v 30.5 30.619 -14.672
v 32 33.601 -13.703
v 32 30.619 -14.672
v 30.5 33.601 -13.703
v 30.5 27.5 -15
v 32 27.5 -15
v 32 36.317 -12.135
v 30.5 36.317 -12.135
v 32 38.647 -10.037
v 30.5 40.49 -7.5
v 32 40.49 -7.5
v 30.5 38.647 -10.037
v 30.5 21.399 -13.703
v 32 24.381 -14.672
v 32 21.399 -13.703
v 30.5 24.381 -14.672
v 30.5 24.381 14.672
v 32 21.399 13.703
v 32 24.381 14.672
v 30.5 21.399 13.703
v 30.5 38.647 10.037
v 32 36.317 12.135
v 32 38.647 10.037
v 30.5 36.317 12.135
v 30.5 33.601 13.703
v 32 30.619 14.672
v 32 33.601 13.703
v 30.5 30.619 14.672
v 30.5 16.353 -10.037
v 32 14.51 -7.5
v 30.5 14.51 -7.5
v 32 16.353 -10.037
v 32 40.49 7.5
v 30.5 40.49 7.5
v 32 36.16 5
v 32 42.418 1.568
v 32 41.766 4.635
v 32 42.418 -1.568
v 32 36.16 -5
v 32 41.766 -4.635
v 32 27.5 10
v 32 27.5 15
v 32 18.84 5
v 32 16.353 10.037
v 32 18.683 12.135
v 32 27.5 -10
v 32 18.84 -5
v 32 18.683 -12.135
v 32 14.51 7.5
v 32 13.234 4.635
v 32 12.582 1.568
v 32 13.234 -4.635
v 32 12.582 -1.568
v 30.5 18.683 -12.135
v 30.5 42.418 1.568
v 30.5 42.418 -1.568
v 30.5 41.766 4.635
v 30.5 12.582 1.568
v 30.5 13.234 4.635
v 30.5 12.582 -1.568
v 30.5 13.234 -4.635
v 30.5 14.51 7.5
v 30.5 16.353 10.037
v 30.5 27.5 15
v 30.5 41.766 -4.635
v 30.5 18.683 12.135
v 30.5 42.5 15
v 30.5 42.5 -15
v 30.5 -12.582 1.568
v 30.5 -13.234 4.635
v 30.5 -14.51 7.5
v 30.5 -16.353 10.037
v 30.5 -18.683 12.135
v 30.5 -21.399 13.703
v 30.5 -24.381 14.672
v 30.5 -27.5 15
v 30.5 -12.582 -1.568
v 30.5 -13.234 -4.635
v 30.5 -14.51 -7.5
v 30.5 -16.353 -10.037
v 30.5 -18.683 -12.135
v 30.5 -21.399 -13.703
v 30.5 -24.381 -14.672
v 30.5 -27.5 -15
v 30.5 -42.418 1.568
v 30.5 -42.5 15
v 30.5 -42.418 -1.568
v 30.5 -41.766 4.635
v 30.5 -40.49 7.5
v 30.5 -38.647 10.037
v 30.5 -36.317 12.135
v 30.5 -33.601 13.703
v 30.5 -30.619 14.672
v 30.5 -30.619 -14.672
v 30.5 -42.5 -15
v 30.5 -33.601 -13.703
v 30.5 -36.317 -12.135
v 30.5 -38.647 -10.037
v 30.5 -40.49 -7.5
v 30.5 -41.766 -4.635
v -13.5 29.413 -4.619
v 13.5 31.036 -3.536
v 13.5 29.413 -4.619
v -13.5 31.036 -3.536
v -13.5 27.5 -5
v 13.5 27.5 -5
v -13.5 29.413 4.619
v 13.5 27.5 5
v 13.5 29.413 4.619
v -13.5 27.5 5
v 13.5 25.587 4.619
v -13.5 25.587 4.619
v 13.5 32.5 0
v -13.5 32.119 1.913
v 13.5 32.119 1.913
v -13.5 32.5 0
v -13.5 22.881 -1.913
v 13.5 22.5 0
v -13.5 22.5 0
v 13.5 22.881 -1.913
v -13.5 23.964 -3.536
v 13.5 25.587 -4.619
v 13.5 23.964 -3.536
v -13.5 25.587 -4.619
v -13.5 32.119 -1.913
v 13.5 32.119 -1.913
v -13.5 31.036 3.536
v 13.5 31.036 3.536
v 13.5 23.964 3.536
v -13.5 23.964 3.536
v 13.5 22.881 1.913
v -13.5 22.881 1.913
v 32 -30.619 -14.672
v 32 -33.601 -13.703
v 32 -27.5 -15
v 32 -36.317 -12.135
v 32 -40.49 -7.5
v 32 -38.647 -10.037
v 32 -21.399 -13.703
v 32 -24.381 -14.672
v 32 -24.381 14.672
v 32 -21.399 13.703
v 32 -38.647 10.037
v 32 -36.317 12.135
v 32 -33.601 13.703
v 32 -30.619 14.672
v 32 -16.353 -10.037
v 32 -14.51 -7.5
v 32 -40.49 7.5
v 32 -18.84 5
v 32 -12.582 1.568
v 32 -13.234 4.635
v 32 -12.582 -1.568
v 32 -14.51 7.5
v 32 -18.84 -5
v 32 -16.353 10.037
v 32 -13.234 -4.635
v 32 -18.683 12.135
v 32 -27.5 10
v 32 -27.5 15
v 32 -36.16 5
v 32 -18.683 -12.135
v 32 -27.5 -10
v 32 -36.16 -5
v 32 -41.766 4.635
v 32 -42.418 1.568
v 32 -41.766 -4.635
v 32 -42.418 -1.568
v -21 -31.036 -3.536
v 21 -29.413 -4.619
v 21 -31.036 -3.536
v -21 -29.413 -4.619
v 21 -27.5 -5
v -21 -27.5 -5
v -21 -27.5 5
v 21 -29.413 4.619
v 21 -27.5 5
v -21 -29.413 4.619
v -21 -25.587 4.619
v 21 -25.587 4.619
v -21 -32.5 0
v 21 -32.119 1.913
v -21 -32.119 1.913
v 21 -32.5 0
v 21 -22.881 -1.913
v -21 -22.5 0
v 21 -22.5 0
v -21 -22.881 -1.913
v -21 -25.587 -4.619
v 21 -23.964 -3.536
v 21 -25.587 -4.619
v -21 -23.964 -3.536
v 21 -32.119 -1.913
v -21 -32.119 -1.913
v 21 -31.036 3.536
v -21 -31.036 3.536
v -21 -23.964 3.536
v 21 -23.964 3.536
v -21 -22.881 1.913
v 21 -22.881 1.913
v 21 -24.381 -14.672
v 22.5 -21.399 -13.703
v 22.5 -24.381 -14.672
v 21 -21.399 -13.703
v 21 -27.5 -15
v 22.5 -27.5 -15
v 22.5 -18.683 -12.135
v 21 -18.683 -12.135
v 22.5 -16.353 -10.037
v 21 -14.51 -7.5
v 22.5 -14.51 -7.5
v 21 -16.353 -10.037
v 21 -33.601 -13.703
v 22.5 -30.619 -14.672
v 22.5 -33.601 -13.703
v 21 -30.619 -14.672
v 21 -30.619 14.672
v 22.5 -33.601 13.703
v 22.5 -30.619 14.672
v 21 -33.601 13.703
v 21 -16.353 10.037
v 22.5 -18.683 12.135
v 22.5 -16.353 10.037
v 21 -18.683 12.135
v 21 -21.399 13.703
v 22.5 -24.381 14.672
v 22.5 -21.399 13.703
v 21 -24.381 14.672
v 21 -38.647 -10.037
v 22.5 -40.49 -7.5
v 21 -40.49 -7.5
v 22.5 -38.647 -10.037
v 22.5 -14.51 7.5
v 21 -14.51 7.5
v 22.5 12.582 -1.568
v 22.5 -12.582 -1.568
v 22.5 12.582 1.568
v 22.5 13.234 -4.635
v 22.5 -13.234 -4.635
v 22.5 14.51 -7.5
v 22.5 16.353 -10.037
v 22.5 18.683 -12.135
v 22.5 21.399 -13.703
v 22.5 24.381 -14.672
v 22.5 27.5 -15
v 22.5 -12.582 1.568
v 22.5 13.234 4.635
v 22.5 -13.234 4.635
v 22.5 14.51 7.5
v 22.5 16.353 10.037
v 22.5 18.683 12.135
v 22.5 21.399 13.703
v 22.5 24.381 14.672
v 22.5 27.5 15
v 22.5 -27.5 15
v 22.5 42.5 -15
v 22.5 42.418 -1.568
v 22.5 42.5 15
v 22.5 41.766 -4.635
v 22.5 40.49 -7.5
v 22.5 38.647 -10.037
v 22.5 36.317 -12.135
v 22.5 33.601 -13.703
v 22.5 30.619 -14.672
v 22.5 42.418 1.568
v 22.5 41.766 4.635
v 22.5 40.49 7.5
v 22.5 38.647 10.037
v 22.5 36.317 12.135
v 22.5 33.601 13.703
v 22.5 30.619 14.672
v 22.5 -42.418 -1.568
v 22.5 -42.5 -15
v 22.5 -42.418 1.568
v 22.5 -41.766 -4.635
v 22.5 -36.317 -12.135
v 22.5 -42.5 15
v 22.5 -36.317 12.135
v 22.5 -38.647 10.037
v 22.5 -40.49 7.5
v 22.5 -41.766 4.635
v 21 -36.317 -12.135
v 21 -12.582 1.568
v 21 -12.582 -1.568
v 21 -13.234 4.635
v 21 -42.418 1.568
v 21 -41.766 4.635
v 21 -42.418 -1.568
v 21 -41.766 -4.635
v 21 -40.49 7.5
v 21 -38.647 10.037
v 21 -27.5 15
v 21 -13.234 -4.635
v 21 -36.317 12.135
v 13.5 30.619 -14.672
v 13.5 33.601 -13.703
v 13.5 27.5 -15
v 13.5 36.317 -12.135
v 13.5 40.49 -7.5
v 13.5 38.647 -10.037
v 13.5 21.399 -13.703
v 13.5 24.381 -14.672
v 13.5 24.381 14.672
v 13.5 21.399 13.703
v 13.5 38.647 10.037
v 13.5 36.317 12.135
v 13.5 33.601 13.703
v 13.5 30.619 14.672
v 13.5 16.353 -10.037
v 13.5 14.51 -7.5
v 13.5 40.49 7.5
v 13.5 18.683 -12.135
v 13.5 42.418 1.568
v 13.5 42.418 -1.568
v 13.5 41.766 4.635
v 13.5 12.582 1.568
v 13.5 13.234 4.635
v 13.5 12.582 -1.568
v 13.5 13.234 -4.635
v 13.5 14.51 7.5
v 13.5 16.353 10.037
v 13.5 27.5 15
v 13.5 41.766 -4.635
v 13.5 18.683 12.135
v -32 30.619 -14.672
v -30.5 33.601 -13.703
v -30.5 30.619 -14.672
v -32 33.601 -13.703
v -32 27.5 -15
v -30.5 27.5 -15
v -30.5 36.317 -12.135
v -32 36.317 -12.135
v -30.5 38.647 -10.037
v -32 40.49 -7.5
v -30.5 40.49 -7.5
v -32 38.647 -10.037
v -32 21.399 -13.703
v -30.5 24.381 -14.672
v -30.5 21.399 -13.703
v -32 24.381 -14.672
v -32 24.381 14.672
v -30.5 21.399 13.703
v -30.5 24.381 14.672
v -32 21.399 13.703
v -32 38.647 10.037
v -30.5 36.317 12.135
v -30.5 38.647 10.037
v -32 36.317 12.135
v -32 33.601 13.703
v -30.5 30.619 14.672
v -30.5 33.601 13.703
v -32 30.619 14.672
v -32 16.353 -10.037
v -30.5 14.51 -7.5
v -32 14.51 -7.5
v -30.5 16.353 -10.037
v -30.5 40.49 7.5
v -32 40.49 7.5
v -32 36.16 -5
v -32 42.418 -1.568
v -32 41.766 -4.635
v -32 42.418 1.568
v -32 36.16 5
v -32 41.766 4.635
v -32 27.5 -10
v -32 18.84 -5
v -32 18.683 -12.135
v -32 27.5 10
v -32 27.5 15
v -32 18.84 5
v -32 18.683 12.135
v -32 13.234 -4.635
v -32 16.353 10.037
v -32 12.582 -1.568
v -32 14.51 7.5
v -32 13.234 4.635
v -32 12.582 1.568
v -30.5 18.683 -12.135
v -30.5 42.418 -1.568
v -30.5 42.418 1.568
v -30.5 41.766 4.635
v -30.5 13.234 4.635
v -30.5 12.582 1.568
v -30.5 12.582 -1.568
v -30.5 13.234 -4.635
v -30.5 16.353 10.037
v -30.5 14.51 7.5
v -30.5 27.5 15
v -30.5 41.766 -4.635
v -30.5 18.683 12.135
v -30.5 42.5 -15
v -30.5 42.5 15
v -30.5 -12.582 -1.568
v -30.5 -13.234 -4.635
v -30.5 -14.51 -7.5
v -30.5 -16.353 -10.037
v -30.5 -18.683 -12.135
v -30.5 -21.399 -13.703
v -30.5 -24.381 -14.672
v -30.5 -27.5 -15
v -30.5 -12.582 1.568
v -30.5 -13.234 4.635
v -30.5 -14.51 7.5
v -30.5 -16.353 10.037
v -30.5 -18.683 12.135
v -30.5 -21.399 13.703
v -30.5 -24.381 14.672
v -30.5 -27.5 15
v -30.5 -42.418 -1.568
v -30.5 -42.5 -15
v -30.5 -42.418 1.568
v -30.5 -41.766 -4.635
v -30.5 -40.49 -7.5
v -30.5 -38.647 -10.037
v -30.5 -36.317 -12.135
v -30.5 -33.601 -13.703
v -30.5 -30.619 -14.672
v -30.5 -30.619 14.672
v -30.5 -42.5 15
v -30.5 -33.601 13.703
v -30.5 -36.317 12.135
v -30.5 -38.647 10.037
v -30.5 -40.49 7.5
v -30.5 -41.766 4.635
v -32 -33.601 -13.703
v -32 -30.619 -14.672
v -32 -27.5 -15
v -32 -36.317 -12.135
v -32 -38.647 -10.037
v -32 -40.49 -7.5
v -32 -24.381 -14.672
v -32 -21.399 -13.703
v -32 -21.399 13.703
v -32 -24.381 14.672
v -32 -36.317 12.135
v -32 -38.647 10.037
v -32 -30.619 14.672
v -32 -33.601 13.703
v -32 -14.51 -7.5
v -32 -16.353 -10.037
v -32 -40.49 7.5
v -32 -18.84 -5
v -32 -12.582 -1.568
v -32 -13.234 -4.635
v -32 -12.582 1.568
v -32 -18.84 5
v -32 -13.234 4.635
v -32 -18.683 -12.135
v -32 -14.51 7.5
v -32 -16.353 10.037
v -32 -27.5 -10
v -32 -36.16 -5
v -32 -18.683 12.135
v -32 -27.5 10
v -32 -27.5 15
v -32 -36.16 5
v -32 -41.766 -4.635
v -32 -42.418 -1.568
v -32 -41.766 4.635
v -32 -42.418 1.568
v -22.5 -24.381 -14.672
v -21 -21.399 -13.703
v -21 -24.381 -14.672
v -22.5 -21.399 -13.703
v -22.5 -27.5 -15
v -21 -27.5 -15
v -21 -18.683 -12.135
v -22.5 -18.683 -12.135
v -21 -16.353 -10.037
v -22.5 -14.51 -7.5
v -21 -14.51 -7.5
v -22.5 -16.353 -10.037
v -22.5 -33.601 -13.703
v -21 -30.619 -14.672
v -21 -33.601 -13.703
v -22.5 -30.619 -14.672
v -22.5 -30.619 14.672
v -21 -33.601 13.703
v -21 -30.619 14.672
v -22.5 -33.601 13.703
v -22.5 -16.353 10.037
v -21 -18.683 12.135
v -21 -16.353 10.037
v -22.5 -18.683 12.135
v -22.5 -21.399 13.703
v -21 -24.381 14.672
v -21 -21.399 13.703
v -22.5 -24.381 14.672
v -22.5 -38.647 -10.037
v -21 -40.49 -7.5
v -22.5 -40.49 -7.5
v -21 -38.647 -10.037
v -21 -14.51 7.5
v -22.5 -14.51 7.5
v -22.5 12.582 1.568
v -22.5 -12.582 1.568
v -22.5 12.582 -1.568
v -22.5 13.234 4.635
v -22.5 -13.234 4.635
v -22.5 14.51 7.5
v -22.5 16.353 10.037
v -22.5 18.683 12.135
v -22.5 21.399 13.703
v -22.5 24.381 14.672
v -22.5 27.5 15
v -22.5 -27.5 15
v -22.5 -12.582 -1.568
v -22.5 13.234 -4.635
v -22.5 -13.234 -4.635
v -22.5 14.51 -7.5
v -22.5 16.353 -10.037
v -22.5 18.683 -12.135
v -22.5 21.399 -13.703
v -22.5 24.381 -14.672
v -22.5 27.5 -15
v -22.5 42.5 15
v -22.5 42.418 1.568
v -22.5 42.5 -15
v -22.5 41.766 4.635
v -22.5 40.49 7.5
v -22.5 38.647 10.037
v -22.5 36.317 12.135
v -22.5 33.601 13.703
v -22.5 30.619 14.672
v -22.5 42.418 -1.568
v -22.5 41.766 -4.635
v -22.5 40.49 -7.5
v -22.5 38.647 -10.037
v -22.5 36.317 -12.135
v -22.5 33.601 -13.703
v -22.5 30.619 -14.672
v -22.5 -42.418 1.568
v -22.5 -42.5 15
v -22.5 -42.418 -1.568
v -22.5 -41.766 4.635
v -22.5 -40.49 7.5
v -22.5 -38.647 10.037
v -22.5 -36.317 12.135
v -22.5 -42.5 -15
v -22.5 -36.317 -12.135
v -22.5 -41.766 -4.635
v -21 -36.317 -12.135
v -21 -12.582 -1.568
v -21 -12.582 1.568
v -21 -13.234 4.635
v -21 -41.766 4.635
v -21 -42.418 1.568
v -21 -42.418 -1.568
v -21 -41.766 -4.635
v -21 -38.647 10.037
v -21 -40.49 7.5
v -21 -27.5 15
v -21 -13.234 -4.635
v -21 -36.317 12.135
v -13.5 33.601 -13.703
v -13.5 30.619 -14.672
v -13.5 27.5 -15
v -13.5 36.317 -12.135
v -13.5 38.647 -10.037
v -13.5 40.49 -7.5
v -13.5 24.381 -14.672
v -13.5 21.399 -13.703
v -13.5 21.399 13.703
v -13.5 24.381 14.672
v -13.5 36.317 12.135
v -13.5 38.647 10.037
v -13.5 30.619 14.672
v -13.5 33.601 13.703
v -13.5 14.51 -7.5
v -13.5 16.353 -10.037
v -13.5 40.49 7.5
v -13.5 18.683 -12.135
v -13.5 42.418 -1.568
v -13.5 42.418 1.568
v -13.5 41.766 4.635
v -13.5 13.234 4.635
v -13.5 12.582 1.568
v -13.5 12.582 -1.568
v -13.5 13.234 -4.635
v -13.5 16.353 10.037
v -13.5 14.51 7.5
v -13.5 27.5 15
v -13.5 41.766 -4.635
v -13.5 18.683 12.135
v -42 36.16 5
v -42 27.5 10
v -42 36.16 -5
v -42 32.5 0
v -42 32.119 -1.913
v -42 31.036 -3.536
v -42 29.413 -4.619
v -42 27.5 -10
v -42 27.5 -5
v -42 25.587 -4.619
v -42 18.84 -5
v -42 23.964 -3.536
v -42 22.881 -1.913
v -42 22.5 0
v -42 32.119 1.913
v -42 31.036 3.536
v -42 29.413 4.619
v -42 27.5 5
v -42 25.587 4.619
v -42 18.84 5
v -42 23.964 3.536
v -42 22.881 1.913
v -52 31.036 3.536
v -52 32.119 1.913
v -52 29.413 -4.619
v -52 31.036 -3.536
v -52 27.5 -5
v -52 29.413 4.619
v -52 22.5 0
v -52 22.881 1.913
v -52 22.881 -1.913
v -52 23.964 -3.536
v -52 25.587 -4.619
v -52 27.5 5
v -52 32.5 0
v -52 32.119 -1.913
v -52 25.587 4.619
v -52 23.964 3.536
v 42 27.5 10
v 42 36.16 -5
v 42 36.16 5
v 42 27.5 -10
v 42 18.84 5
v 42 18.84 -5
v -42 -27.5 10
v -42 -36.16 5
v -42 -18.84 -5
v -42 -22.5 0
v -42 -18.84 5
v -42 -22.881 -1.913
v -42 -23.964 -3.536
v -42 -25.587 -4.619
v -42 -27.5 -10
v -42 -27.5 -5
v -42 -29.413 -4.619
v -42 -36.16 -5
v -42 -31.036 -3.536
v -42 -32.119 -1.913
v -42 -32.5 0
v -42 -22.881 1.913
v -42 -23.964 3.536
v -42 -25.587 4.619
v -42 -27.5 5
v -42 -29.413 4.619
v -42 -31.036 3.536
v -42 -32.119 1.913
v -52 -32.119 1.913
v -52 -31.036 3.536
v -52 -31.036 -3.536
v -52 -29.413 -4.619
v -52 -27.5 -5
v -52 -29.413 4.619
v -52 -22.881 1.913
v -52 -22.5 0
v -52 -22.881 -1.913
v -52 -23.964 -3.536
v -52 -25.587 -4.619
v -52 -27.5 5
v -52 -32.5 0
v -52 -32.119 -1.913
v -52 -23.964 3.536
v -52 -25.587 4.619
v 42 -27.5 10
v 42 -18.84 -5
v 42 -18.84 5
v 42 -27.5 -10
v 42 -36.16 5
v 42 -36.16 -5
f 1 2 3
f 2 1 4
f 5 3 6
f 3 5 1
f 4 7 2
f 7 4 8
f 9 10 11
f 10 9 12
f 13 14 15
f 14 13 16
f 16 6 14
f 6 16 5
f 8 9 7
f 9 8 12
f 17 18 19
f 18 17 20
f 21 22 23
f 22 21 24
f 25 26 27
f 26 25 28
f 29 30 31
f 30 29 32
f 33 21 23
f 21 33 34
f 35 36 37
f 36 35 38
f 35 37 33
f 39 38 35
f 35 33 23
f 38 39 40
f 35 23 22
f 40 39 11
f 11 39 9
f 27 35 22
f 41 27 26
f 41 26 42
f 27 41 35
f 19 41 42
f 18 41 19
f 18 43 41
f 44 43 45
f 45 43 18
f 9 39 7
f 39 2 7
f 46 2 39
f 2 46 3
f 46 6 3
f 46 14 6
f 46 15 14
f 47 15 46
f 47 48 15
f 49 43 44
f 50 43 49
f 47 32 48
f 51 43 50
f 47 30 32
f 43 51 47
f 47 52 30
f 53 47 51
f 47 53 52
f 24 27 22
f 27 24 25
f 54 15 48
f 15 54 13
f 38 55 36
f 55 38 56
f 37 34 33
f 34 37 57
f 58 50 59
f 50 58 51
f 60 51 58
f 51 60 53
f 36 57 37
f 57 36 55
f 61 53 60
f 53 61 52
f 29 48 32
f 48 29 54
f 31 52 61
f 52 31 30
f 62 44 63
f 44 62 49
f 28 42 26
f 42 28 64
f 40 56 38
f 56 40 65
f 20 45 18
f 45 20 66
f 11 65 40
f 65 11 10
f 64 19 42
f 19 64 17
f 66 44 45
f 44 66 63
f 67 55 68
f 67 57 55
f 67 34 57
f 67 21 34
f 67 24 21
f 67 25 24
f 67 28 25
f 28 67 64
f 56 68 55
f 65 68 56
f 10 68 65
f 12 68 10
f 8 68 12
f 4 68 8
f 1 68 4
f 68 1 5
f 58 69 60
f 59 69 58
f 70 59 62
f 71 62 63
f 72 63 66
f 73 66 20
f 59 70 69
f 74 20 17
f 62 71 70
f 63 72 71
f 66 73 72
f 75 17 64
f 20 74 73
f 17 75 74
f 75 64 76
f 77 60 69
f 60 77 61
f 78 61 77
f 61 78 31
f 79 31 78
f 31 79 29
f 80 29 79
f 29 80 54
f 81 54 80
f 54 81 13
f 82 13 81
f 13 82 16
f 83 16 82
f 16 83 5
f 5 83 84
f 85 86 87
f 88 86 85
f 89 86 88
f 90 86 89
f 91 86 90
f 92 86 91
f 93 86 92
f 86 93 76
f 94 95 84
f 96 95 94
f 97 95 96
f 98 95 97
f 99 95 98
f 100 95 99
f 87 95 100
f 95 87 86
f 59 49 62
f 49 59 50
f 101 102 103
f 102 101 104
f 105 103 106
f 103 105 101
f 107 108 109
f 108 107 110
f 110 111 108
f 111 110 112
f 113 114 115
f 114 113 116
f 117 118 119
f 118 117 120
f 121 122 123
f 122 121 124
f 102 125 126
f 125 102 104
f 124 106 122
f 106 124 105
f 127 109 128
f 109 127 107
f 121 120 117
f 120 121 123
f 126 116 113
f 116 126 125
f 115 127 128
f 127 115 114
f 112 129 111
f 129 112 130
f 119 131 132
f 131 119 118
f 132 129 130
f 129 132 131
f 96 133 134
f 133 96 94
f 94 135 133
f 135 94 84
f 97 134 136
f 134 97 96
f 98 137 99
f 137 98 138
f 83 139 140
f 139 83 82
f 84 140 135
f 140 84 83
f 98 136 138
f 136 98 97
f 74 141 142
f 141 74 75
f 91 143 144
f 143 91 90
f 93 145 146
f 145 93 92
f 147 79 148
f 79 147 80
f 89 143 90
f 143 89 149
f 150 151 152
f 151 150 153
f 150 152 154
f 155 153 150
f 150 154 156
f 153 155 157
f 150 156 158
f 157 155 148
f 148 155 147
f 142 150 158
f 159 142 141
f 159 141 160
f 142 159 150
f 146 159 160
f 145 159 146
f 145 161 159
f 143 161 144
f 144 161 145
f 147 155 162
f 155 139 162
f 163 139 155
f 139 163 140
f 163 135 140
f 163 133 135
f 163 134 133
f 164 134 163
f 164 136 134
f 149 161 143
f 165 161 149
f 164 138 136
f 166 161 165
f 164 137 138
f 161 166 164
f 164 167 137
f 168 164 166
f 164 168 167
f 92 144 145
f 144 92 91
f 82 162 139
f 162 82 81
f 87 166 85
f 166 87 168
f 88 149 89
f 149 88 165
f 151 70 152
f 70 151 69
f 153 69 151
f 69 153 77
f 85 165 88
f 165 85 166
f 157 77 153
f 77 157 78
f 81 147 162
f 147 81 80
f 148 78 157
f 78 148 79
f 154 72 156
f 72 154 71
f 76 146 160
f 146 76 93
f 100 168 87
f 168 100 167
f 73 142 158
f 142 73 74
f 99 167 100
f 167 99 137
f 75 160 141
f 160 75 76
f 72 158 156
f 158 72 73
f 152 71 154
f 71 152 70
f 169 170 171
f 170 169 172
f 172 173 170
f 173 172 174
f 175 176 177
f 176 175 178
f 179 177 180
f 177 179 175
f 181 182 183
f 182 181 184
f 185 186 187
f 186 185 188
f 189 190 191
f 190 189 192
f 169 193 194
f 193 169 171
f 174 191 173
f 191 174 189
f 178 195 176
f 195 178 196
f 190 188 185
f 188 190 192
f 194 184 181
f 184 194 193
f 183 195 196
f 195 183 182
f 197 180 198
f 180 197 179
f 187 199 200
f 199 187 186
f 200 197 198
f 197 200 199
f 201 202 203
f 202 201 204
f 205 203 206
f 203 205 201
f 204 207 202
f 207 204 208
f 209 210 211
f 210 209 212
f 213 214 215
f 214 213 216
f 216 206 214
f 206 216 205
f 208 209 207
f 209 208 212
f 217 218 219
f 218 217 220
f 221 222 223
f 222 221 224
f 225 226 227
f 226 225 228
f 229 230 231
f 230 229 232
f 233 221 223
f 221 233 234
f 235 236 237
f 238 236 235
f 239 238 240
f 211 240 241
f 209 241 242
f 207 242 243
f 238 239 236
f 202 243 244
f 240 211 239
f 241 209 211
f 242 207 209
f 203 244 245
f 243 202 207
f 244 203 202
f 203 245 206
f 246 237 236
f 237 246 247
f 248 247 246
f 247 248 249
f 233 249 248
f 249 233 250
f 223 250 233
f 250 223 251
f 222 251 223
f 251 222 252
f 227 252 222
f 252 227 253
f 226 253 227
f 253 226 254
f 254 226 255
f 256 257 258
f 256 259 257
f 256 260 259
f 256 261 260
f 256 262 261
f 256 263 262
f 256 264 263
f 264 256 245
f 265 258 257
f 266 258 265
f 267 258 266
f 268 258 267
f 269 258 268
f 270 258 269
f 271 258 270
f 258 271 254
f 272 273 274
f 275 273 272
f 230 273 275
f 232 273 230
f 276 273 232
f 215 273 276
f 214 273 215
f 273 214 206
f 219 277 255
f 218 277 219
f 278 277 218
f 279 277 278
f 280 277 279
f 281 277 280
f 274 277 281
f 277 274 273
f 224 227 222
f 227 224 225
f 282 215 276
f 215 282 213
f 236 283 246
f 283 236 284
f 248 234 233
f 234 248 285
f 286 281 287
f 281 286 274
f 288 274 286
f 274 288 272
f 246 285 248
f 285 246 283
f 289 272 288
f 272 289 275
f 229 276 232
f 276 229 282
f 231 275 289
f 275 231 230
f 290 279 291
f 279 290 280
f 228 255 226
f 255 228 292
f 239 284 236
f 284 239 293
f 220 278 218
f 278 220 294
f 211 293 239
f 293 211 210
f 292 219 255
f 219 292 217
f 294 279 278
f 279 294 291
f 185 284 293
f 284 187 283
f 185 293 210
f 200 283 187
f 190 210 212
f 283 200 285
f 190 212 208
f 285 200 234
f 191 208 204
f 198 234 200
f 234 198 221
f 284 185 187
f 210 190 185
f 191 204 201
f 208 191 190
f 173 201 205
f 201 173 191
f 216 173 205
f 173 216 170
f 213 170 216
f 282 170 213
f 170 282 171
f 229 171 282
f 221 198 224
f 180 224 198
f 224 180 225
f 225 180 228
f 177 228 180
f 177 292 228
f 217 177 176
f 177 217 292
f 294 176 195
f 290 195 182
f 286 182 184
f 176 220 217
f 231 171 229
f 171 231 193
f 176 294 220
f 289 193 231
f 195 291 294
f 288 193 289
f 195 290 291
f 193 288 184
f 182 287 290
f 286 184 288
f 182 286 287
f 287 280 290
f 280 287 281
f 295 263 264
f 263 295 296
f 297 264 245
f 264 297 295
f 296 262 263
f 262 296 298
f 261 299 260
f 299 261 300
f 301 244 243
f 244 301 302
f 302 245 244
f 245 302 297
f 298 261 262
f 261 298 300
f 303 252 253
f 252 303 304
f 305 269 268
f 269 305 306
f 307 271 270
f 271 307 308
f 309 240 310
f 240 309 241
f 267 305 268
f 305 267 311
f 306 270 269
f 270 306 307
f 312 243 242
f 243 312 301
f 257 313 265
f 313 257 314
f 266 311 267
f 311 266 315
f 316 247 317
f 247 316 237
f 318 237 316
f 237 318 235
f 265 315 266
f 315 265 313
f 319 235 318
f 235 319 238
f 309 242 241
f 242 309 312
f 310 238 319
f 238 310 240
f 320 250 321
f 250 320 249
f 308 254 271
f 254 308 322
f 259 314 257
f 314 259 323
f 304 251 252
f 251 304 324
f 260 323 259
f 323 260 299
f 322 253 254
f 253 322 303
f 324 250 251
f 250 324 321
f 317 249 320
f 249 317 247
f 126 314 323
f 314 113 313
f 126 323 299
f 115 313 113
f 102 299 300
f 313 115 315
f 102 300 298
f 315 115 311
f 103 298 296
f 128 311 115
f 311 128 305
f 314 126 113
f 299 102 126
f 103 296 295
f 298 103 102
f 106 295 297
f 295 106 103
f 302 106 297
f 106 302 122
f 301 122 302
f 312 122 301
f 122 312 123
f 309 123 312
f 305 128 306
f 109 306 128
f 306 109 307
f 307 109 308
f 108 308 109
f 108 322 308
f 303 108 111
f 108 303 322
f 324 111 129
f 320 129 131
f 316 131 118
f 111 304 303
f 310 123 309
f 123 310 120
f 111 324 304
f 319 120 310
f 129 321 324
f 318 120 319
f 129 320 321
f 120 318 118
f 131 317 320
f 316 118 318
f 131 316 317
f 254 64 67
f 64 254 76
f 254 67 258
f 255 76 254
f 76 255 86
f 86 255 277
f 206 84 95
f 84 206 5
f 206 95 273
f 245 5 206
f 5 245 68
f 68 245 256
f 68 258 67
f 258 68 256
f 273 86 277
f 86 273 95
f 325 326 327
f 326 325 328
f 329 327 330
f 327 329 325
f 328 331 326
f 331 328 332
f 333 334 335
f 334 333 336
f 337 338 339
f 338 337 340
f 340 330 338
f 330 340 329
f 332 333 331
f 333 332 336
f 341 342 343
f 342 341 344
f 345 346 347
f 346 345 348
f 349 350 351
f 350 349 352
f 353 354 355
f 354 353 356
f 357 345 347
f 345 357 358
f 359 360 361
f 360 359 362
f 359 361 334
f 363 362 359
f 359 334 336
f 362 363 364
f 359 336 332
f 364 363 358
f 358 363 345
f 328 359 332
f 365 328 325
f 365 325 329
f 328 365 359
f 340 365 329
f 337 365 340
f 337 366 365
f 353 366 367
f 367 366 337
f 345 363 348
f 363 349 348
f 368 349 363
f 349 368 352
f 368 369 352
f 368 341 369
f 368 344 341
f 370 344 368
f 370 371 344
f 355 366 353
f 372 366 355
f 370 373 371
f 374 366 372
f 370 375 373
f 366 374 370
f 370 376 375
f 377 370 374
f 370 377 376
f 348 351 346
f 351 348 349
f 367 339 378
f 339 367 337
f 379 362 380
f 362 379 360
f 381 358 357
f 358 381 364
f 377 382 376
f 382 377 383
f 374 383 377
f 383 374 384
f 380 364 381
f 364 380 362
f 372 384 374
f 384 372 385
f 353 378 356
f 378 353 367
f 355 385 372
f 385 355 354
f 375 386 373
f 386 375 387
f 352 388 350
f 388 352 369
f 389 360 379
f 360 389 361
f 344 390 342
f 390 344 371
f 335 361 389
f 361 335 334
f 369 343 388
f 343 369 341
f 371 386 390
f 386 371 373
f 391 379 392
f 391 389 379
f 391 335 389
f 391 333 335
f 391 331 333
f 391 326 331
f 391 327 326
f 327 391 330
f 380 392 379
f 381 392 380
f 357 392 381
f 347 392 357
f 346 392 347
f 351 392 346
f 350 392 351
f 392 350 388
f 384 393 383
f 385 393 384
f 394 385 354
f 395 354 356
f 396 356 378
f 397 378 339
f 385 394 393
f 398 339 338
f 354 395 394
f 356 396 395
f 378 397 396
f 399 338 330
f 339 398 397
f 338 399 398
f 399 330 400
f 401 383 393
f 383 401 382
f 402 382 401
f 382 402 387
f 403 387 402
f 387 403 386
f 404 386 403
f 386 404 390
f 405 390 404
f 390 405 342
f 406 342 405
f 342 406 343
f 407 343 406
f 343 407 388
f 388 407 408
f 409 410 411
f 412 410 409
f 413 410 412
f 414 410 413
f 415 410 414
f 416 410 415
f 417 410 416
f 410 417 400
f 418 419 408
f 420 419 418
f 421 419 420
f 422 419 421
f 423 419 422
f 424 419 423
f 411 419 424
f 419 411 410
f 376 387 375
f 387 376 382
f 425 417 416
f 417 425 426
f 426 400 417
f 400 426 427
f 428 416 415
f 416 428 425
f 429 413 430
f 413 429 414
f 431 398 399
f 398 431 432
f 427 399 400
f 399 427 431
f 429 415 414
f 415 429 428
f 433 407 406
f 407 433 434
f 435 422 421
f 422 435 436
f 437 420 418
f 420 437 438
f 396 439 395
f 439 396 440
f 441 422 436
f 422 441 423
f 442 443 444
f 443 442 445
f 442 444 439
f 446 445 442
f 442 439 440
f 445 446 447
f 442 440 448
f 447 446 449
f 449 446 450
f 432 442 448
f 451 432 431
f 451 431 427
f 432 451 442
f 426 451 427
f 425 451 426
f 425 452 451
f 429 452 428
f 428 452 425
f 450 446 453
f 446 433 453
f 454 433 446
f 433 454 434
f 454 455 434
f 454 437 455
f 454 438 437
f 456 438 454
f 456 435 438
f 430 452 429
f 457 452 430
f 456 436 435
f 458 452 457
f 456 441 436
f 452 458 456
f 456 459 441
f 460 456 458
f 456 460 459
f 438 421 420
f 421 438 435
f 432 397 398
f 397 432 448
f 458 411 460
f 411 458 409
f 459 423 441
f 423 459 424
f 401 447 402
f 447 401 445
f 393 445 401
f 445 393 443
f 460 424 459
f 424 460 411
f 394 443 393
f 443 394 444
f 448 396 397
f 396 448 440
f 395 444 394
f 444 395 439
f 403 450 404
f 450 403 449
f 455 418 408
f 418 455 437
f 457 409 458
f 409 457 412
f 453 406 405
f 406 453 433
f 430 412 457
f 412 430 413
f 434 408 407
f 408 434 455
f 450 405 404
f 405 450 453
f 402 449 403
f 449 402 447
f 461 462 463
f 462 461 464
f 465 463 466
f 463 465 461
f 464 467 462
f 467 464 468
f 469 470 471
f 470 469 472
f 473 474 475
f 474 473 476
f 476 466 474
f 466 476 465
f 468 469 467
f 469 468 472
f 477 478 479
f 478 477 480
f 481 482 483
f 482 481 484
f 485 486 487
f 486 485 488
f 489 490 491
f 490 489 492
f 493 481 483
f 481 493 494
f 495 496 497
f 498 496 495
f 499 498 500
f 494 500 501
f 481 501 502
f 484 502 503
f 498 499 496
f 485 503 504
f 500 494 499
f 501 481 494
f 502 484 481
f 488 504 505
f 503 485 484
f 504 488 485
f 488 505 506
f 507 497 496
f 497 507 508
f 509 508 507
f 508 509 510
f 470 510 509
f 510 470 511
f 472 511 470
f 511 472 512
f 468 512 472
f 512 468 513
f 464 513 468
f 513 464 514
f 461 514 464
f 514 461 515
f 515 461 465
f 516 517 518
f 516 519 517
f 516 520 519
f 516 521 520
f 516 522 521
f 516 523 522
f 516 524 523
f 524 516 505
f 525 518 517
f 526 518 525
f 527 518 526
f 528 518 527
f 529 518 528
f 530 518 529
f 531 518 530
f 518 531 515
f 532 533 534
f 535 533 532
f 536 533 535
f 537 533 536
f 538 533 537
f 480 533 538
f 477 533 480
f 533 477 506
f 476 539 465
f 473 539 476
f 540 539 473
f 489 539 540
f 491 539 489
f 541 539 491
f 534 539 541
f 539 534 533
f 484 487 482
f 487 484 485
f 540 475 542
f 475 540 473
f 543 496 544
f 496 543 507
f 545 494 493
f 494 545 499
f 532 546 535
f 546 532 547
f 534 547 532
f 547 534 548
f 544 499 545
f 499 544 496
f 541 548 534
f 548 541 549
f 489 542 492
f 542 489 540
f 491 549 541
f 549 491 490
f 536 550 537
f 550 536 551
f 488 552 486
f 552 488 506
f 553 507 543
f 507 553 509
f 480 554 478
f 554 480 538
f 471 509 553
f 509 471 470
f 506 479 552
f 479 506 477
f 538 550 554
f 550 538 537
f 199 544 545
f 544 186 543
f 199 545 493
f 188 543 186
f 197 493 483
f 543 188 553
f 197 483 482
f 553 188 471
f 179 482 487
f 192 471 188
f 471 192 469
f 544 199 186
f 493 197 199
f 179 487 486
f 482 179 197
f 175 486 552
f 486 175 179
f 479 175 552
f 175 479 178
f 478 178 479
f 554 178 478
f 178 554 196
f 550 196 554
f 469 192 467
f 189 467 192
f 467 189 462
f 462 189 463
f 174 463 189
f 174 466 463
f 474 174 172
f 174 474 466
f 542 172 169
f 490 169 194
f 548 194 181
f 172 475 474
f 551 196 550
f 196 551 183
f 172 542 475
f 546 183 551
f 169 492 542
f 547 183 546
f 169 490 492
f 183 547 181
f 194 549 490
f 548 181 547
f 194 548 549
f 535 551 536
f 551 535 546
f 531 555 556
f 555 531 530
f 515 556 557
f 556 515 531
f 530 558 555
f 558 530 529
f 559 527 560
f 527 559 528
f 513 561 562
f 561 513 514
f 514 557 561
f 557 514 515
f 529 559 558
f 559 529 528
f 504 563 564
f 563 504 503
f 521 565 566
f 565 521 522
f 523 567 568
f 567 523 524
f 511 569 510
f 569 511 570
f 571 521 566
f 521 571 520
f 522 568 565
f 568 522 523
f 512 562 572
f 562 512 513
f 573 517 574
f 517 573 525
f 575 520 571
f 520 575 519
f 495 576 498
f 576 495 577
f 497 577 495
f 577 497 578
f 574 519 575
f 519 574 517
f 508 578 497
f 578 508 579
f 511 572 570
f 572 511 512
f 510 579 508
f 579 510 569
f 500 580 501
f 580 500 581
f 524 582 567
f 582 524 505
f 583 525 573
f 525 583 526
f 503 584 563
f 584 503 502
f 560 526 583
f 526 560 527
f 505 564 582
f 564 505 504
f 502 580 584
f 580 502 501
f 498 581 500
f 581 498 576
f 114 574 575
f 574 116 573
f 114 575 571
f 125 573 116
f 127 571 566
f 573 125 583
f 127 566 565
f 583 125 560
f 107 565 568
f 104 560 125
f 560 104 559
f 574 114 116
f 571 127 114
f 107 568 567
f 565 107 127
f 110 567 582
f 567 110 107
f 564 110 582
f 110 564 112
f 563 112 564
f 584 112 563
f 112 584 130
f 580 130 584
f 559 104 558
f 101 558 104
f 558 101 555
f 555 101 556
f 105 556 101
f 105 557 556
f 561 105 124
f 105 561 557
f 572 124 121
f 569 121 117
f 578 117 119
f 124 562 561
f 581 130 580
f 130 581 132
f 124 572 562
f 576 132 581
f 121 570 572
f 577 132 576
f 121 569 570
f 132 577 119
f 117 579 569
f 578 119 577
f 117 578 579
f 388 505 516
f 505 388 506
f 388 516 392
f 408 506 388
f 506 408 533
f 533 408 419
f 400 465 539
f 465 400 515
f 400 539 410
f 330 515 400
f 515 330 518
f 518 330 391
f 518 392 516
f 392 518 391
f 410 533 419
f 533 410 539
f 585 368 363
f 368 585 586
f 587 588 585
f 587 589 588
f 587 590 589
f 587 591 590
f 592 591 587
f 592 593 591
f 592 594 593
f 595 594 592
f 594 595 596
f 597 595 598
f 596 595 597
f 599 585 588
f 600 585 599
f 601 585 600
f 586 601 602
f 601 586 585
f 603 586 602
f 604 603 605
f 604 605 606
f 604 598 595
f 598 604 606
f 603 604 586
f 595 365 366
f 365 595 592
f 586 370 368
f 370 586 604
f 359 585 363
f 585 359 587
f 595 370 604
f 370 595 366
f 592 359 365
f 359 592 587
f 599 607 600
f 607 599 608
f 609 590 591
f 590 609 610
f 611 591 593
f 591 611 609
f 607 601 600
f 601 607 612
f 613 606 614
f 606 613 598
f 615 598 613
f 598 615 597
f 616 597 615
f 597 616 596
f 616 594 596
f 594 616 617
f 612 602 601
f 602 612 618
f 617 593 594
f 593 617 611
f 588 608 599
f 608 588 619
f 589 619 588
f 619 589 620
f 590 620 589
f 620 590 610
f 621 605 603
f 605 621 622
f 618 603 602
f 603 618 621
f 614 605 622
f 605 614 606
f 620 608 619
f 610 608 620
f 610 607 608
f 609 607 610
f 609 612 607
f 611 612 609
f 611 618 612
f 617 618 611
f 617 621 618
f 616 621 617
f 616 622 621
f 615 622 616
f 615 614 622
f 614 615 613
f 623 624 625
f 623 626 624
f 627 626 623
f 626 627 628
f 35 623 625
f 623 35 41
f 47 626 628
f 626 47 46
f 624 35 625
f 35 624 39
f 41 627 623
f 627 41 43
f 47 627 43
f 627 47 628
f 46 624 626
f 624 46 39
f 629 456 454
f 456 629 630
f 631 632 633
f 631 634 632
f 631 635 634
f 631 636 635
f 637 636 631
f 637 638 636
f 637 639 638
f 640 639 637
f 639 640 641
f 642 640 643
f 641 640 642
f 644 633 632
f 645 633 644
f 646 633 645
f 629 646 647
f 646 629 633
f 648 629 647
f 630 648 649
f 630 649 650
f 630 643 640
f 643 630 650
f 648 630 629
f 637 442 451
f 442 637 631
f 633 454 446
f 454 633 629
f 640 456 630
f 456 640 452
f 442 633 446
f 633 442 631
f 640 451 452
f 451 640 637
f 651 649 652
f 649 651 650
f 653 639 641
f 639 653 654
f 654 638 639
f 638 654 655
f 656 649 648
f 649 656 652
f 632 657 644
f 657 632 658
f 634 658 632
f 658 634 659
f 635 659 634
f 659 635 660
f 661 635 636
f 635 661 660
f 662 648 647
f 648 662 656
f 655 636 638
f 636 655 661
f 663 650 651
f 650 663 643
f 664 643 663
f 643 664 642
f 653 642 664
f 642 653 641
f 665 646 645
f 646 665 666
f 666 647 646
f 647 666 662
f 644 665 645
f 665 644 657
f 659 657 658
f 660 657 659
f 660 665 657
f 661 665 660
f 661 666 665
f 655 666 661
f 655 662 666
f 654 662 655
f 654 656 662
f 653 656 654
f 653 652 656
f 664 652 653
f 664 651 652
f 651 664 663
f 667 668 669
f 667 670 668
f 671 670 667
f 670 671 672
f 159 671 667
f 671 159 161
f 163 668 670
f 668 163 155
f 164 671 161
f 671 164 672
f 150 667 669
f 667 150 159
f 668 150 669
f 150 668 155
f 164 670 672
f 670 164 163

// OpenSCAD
// file: ../common/metric_nut.scad
// include <../../config.scad>;
use <./beam_hexagonal.scad>;
use <./metric_bolt_functions.scad>;

module metric_nut(size, centre = true) {
    height = get_metric_bolt_head_height(size);
    diameter = get_metric_bolt_head_diameter(size);
    radius = diameter / 2;
    color("gray") difference() {
        // body
        beam_hexagonal(height, diameter, centre = centre, suppress_shopping_outputs = true);
        // hole
        cylinder(height, size / 2, size / 2, center = centre);
    }
    // Shopping
    echo(str("Nut: Nut M", size, " - x1"));
}

// $fn = 200;
metric_nut(12);
// file: ../common/beam_hexagonal.scad
// include <../../config.scad>;

module beam_hexagonal(L, d, centre = true, suppress_shopping_outputs = false) {
    radius = d / 2;
    linear_extrude(L, center = centre) polygon([[radius, 0], [radius * cos(60), radius * sin(60)], [radius * cos(120), radius * sin(120)], [radius * cos(180), radius * sin(180)], [radius * cos(240), radius * sin(240)], [radius * cos(300), radius * sin(300)]]);
    // Shopping
    if (!suppress_shopping_outputs) {
        echo(str("Hexagonal beam: Hexagonal beam Φ", d, "mm x ", L, "mm - x1"));
    }
}

// $fn = 200;
beam_hexagonal(500, 50);
// file: ../fixings/tube_clamp_square_base_plate_132_functions.scad
function get_L_shaft_with_base_plate_square_base_plate_132(beam_width) = 
    // (beam_width == 40) ?
    75
;
function get_R_plate_square_base_plate_132(beam_width) = 
    // (beam_width == 40) ?
    [143, 75, 18.5]
;
function get_thickness_square_base_plate_132(beam_width) = 
    // (beam_width == 40) ?
    8
;
function get_offset_hole_x_square_base_plate_132(beam_width) = 
    // (beam_width == 40) ?
    100 / 2
;
function get_diameter_hole_square_base_plate_132(beam_width) = 
    // (beam_width == 40) ?
    10
;
// file: ../fixings/tube_clamp_round_base_plate_132_functions.scad
function get_L_shaft_with_base_plate_round_base_plate_132(tube_diameter) = 
    (tube_diameter == 27) ? 
        85
    : (tube_diameter == 42) ?
        122
    : 25
;
function get_R_plate_round_base_plate_132(tube_diameter) = 
    (tube_diameter == 27) ? 
        [64, 114, 7]
    : (tube_diameter == 42) ?
        [80, 140, 10]
    : [10, 20, 1]
;
function get_offset_hole_y_round_base_plate_132(tube_diameter) = 
    (tube_diameter == 27) ? 
        38
    : (tube_diameter == 42) ?
        50
    : 10
;
function get_diameter_hole_round_base_plate_132(tube_diameter) = 10;
// file: ../fixings/tube_clamp_round_3_way_through_116_functions.scad
function  get_L_shaft_long_round_3_way_through_116(tube_diameter) = 
    (tube_diameter == 27) ? 
        42
    : (tube_diameter == 42) ?
        60
    : 25
;
function get_thickness_round_3_way_through_116(tube_diameter) = 7;
function get_L_shaft_short_round_3_way_through_116(tube_diameter) = tube_diameter + 2 * get_thickness_round_3_way_through_116();
// file: ../fixings/tube_clamp_round_tee_long_104_functions.scad
// include <../../config.scad>;

function get_L_shaft_long_round_tee_long_104(tube_diameter) = 
    (tube_diameter == 27) ? 
        85
    : (tube_diameter == 42) ?
        122
    : 25
;
function get_L_shaft_short_round_tee_long_104(tube_diameter) = 
    (tube_diameter == 27) ? 
        42
    : (tube_diameter == 42) ?
        61
    : 10
;
// file: ../brake/brake_assembly_functions.scad
// include <../../config.scad>; // circular reference!

function get_y_pos_lead_fixing_ballscrew_to_brake_arms(angle_brake_rod, y_pos_axle_rear, x_pos_axle_leg_rear, x_offset_fixing_brake_arm_to_lead_plate) = y_pos_axle_rear + (x_pos_axle_leg_rear - x_offset_fixing_brake_arm_to_lead_plate) / tan(angle_brake_rod); // (X_POS_AXLE_LEG_REAR - X_OFFSET_FIXING_BRAKE_ARM_TO_LEAD_PLATE)
// file: ../common/metric_bolt_functions.scad
function get_metric_bolt_head_height(size) = size;
function get_metric_bolt_head_diameter(size) = size * 2;
function get_metric_bolt_washer_diameter_safe_working_clearance(size) = 
    (size < 20) ?
        4 * size
    :
        3 * size
;
// file: ../common/washer.scad
include <../../config.scad>;

module washer(t, d_outer, d_inner, centre = true) {
    r_outer = d_outer / 2;
    r_inner = d_inner / 2;
    color("silver") difference() {
        cylinder(t, r_outer, r_outer, center = centre);
        cylinder(t, r_inner, r_inner, center = centre);
    }
    // Shopping
    echo(str("Washer: Washer Φ", d_outer, "mm x ", d_inner, "mm x ", t, "mm - x1"));
}

// $fn = 200;
washer(3, 10, 40);
// file: ../common/metric_bolt.scad
// include <../../config.scad>;
use <./beam_hexagonal.scad>;
use <./metric_bolt_functions.scad>;
use <./metric_nut.scad>;

module metric_bolt(size, length, has_nut = true, offset_nut_from_end = 0) {
    echo("Metric bolt assembly:");
    head_height = get_metric_bolt_head_height(size);
    head_diameter = get_metric_bolt_head_diameter(size);
    head_radius = head_diameter / 2;
    color("gray") union() {
        // Stem
        cylinder(length, size / 2, size / 2, center = true);
        // Head
        translate([0, 0, length / 2 - size / 2]) beam_hexagonal(head_height, head_diameter, centre = true, suppress_shopping_outputs = true);
        if (has_nut) {
            // Nut
            translate([0, 0, -(length / 2 - size / 2) + offset_nut_from_end]) metric_nut(size);
        }
    }
    // Shopping
    echo(str("Bolt: Bolt M", size, " x ", length, "mm - x1"));
}

// $fn = 200;
metric_bolt(12, 100);
translate([30, 0, 0]) metric_bolt(12, 100, false);
translate([60, 0, 0]) metric_bolt(12, 100, true, 5);
// main file
include <../../config.scad>;
use <../common/metric_bolt.scad>;
use <../common/washer.scad>;

module tiller_joint() {
    echo("Tiller joint assembly:");
    R_plate_tiller = [T_PLATE, L_JOINT_TILLER_EXTENSION, 3 * SIZE_BOLT_JOINT_TILLER_EXTENSION];
    x_pos_plate = (D_AXLE_FRONT + R_plate_tiller[0]) / 2 + T_WASHER_TILLER_JOINT;
    h_bolt_head = get_metric_bolt_head_height(SIZE_BOLT_JOINT_TILLER_EXTENSION);
    L_bolt = D_AXLE_FRONT + 2 * (h_bolt_head + T_WASHER_TILLER_JOINT * 2 + R_plate_tiller[0]) + L_BOLT_EXTENSION;
    y_pos_bolt = R_plate_tiller[1] / 2 - OFFSET_BOLT_JOINT_TILLER_EXTENSION_AXIAL;
    x_pos_washer_internal = D_AXLE_FRONT / 2 + T_WASHER_TILLER_JOINT / 2;
    x_pos_washer_external = L_bolt / 2 - L_BOLT_EXTENSION / 2 - h_bolt_head - T_WASHER_TILLER_JOINT / 2;
    count_washers_each_side_front = 5;
    union() {
        for (index_side_x = [0 : 1 : 1]) {
            mirror([index_side_x, 0, 0]) {
                // plates
                color(COLOUR_BEAM_ALUMINIUM) translate([x_pos_plate, 0, 0]) cube(R_plate_tiller, center = true);
                
                for (index_side_y = [0 : 1 : 1]) {
                    mirror([0, index_side_y, 0]) {
                        // washers
                        // external
                        translate([x_pos_washer_external, y_pos_bolt, 0]) rotate([0, 90, 0]) washer(T_WASHER_TILLER_JOINT, D_WASHER_TILLER_JOINT, SIZE_BOLT_JOINT_TILLER_EXTENSION);
                    }
                }
                // rear internal washers
                translate([x_pos_washer_internal, -y_pos_bolt, 0]) rotate([0, 90, 0]) washer(T_WASHER_TILLER_JOINT, D_WASHER_TILLER_JOINT, SIZE_BOLT_JOINT_TILLER_EXTENSION);
                // front internal washers
                for (index_washer_front = [0 : 1 : count_washers_each_side_front]) {
                    translate([x_pos_washer_internal - T_WASHER_TILLER_JOINT * index_washer_front, y_pos_bolt, 0]) rotate([0, 90, 0]) washer(T_WASHER_TILLER_JOINT, D_WASHER_TILLER_JOINT, SIZE_BOLT_JOINT_TILLER_EXTENSION);
                }
            }
        }
        for (index_side_y_only = [0 : 1 : 1]) {
            mirror([0, index_side_y_only, 0]) {
                // bolts
                translate([-L_BOLT_EXTENSION / 2, y_pos_bolt, 0]) rotate([0, 90, 0]) metric_bolt(SIZE_BOLT_JOINT_TILLER_EXTENSION, L_bolt, true, L_BOLT_EXTENSION);
            }
        }
    }
    // Shopping
    echo(str("Plate: Aluminium sheet ", R_plate_tiller[0], "mm x ", R_plate_tiller[1], "mm x ", R_plate_tiller[2], "mm - x2"));
    // echo(str("Washer: Washer Φ", D_WASHER_TILLER_JOINT, "mm x ", T_WASHER_TILLER_JOINT, "mm - x8")); // Tiller joint washers
    // Bolts
}

// output
tiller_joint();
